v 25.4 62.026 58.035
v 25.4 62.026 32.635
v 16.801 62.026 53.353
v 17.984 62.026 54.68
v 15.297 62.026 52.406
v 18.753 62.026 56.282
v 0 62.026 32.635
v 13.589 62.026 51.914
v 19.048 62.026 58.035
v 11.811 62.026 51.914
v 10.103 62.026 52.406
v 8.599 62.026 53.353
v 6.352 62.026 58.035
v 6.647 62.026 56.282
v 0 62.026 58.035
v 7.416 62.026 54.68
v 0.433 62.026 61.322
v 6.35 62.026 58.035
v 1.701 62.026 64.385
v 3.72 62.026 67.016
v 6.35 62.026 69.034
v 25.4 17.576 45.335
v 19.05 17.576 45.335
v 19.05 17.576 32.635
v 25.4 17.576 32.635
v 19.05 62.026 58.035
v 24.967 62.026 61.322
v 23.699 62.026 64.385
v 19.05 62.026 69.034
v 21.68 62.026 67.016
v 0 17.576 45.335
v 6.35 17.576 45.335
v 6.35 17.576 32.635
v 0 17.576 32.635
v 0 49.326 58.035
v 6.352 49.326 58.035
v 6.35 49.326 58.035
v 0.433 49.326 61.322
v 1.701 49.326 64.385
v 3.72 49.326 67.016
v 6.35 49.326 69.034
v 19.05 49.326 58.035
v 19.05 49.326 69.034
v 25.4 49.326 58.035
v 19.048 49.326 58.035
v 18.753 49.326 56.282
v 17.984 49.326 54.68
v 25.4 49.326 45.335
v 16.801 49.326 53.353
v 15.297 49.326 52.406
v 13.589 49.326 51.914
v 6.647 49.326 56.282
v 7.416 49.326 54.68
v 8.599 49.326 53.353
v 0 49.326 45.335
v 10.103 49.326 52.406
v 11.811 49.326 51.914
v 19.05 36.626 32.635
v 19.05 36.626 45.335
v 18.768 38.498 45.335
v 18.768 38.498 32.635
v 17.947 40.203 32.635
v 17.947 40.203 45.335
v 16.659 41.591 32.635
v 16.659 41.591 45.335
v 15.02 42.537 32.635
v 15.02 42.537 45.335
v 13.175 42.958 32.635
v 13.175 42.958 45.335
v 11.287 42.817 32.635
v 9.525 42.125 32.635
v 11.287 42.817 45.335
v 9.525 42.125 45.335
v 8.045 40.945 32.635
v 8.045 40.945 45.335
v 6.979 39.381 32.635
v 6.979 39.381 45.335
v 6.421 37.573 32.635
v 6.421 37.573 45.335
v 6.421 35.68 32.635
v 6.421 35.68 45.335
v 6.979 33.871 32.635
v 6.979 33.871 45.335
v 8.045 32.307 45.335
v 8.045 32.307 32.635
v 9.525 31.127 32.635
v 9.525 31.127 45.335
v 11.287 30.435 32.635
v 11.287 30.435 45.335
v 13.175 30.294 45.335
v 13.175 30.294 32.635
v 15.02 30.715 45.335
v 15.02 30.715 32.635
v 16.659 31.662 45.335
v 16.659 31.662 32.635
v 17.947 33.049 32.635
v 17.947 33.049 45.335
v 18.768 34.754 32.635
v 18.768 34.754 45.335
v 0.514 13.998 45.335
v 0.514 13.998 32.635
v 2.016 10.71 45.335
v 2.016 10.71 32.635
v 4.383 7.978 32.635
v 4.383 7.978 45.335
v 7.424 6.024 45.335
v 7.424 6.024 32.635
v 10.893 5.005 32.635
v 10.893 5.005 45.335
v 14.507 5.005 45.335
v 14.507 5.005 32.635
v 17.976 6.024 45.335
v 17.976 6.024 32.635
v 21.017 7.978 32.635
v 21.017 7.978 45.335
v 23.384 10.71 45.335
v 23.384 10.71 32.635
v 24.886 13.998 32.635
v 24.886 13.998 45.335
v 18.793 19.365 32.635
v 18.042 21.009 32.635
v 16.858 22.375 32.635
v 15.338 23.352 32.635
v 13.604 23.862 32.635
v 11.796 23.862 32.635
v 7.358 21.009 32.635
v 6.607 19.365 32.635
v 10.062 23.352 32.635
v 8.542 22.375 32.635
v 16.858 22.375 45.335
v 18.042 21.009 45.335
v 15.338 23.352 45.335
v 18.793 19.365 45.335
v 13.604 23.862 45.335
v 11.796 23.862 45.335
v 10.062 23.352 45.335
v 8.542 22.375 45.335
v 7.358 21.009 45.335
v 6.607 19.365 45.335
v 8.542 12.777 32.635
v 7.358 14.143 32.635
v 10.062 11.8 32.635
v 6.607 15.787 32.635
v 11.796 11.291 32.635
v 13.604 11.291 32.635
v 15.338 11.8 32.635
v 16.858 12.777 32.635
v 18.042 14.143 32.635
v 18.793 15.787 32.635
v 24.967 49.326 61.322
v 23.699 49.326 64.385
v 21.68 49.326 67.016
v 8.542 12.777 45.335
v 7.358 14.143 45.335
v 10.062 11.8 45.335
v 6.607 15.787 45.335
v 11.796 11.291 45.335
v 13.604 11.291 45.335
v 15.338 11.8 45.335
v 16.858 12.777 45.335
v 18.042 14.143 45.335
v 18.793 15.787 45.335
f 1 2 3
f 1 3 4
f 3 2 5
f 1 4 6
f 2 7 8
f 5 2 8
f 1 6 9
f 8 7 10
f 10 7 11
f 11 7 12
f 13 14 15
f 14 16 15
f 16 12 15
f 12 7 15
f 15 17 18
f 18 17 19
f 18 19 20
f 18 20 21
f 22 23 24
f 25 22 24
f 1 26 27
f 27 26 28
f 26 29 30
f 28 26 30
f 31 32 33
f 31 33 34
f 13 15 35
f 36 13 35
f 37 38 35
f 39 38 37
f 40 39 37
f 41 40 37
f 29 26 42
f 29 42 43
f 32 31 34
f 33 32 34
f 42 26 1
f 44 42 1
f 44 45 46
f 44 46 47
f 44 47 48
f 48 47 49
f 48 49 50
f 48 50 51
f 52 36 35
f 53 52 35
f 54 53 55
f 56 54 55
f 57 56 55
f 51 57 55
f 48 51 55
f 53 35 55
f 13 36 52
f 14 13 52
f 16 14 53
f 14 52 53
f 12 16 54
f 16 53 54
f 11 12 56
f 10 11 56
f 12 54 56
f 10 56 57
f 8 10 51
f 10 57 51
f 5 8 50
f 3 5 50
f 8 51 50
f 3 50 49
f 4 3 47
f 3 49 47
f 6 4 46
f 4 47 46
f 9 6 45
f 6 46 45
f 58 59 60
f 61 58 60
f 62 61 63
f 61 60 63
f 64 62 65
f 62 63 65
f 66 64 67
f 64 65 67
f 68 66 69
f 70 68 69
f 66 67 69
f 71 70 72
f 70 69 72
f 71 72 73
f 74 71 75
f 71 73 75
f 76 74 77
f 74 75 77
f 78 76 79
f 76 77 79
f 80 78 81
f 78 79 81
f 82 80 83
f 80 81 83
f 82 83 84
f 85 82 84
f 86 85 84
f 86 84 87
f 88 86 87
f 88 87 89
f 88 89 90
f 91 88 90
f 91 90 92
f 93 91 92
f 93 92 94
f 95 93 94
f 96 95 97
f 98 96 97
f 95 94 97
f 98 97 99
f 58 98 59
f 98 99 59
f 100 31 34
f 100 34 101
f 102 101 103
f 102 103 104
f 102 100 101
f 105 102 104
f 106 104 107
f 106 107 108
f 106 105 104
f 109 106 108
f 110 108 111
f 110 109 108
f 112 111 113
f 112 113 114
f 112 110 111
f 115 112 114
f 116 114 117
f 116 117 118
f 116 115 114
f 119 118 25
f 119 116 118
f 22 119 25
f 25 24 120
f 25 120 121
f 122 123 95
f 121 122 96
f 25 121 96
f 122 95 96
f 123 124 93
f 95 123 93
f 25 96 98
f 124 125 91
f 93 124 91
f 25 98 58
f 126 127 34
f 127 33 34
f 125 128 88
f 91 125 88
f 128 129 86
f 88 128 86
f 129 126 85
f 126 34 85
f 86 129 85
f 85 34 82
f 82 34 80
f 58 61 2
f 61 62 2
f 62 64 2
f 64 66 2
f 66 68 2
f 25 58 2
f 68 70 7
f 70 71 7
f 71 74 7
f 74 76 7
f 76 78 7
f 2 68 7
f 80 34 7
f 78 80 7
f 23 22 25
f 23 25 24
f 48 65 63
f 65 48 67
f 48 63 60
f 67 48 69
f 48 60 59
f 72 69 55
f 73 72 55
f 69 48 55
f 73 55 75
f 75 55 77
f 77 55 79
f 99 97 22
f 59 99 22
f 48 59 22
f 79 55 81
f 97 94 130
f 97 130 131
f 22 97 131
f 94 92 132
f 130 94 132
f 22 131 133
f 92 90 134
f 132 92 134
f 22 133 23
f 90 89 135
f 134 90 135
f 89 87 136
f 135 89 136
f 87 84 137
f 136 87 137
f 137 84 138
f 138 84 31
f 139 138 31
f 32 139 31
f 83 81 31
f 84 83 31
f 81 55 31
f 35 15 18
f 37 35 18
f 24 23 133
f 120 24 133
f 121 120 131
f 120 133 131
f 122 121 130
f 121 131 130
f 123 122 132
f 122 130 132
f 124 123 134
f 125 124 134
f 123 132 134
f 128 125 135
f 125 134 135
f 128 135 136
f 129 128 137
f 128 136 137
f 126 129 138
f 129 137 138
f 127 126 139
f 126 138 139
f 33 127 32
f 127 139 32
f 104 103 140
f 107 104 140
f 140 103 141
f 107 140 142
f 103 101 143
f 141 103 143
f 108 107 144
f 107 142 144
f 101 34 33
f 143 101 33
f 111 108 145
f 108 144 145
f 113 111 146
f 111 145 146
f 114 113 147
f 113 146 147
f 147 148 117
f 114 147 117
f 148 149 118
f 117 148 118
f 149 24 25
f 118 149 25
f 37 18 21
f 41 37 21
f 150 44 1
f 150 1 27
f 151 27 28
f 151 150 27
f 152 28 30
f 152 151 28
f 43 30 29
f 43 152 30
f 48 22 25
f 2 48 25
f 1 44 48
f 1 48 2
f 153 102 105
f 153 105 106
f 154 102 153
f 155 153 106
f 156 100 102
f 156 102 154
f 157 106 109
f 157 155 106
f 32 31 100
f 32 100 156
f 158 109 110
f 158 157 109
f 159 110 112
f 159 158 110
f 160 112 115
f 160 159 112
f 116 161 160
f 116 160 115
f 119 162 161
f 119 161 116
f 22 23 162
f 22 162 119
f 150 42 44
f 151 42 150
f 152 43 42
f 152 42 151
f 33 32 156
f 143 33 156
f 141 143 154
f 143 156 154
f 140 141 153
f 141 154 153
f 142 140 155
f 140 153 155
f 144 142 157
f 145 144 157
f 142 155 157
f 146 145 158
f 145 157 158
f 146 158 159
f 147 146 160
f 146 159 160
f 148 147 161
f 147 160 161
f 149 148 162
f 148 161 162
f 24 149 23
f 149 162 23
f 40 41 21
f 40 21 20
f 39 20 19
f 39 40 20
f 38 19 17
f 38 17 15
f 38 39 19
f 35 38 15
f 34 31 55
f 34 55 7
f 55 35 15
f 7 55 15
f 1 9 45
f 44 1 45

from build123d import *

# Parameters (mm, degrees)
F1_DEPTH  = 25.4
F3_DEPTH  = 12.7
F4_R      = 6.35
F5_DEPTH  = 12.7
F7_DEPTH  = 12.7
F9_DEPTH  = 12.7
F10_W     = 12.7
F10_H     = 6.35
F11_DEPTH = 12.7
F12_W     = 12.7
F12_H     = 6.35
F13_DEPTH = 12.7
F15_DEPTH = 12.7
F16_W     = 12.7
F16_H     = 14.8796178133
F17_DEPTH = 12.7


with BuildPart() as f1:
    # F0 (on Right) → F1 (new body)
    with BuildSketch(Plane.YZ):
        Polygon((62.0261926534, 32.6354817479), (62.0261926534, 58.0354817479), (49.3261926534, 58.0354817479), (49.3261926534, 45.3354817479), (17.5761926534, 45.3354817479), (17.5761926534, 32.6354817479), align=None)
    extrude(amount=F1_DEPTH)

    # F4 (on face) → F5 (cut)
    with BuildSketch(Plane.XY.offset(45.3354817479)):
        with Locations((12.7, 36.6261926534)):
            Circle(F4_R)
        with BuildLine():
            Line((6.35, 17.5761926534), (19.05, 17.5761926534))
            ThreePointArc((19.05, 17.5761926534), (12.7, 23.9261926534), (6.35, 17.5761926534))
        make_face()
    extrude(amount=-F5_DEPTH, mode=Mode.SUBTRACT)

    # F8 (on face) → F9 (cut)
    with BuildSketch(Plane.XZ.offset(-49.3261926534)):
        with BuildLine():
            Line((19.0478422263, 58.0354817479), (6.3521577737, 58.0354817479))
            ThreePointArc((6.3521577737, 58.0354817479), (12.7, 51.8510083924), (19.0478422263, 58.0354817479))
        make_face()
    extrude(amount=-F9_DEPTH, mode=Mode.SUBTRACT)

    # F10 (on Front) → F11 (cut)
    with BuildSketch(Plane.XZ):
        with Locations((12.7, 61.1516664074)):
            Rectangle(F10_W, F10_H)
    extrude(amount=-F11_DEPTH, mode=Mode.SUBTRACT)

    # F12 (on Front) → F13 (cut)
    with BuildSketch(Plane.XZ):
        with Locations((12.7, 61.4645087423)):
            Rectangle(F12_W, F12_H)
    extrude(amount=-F13_DEPTH, mode=Mode.SUBTRACT)


with BuildPart() as f3:
    # F2 (on face) → F3 (new body)
    with BuildSketch(Plane.XY.offset(45.3354817479)):
        with BuildLine():
            Line((25.4, 17.5761926534), (0, 17.5761926534))
            ThreePointArc((0, 17.5761926534), (12.7, 4.8761926534), (25.4, 17.5761926534))
        make_face()
    extrude(amount=-F3_DEPTH)

    # F6 (on face) → F7 (cut)
    with BuildSketch(Plane.XY.offset(45.3354817479)):
        with BuildLine():
            ThreePointArc((6.35, 17.5761926534), (12.7, 11.2261926534), (19.05, 17.5761926534))
            Line((19.05, 17.5761926534), (6.35, 17.5761926534))
        make_face()
    extrude(amount=-F7_DEPTH, mode=Mode.SUBTRACT)


with BuildPart() as f15:
    # F14 (on face) → F15 (new body)
    with BuildSketch(Plane.XZ.offset(-49.3261926534)):
        with BuildLine():
            Line((0, 58.0354817479), (25.4, 58.0354817479))
            ThreePointArc((25.4, 58.0354817479), (12.7, 70.7354817479), (0, 58.0354817479))
        make_face()
    extrude(amount=-F15_DEPTH)

    # F16 (on face) → F17 (cut)
    with BuildSketch(Plane.XZ.offset(-49.3261926534)):
        with Locations((12.7, 65.4752906545)):
            Rectangle(F16_W, F16_H)
    extrude(amount=-F17_DEPTH, mode=Mode.SUBTRACT)


solid = Compound([f1.part, f3.part, f15.part])
